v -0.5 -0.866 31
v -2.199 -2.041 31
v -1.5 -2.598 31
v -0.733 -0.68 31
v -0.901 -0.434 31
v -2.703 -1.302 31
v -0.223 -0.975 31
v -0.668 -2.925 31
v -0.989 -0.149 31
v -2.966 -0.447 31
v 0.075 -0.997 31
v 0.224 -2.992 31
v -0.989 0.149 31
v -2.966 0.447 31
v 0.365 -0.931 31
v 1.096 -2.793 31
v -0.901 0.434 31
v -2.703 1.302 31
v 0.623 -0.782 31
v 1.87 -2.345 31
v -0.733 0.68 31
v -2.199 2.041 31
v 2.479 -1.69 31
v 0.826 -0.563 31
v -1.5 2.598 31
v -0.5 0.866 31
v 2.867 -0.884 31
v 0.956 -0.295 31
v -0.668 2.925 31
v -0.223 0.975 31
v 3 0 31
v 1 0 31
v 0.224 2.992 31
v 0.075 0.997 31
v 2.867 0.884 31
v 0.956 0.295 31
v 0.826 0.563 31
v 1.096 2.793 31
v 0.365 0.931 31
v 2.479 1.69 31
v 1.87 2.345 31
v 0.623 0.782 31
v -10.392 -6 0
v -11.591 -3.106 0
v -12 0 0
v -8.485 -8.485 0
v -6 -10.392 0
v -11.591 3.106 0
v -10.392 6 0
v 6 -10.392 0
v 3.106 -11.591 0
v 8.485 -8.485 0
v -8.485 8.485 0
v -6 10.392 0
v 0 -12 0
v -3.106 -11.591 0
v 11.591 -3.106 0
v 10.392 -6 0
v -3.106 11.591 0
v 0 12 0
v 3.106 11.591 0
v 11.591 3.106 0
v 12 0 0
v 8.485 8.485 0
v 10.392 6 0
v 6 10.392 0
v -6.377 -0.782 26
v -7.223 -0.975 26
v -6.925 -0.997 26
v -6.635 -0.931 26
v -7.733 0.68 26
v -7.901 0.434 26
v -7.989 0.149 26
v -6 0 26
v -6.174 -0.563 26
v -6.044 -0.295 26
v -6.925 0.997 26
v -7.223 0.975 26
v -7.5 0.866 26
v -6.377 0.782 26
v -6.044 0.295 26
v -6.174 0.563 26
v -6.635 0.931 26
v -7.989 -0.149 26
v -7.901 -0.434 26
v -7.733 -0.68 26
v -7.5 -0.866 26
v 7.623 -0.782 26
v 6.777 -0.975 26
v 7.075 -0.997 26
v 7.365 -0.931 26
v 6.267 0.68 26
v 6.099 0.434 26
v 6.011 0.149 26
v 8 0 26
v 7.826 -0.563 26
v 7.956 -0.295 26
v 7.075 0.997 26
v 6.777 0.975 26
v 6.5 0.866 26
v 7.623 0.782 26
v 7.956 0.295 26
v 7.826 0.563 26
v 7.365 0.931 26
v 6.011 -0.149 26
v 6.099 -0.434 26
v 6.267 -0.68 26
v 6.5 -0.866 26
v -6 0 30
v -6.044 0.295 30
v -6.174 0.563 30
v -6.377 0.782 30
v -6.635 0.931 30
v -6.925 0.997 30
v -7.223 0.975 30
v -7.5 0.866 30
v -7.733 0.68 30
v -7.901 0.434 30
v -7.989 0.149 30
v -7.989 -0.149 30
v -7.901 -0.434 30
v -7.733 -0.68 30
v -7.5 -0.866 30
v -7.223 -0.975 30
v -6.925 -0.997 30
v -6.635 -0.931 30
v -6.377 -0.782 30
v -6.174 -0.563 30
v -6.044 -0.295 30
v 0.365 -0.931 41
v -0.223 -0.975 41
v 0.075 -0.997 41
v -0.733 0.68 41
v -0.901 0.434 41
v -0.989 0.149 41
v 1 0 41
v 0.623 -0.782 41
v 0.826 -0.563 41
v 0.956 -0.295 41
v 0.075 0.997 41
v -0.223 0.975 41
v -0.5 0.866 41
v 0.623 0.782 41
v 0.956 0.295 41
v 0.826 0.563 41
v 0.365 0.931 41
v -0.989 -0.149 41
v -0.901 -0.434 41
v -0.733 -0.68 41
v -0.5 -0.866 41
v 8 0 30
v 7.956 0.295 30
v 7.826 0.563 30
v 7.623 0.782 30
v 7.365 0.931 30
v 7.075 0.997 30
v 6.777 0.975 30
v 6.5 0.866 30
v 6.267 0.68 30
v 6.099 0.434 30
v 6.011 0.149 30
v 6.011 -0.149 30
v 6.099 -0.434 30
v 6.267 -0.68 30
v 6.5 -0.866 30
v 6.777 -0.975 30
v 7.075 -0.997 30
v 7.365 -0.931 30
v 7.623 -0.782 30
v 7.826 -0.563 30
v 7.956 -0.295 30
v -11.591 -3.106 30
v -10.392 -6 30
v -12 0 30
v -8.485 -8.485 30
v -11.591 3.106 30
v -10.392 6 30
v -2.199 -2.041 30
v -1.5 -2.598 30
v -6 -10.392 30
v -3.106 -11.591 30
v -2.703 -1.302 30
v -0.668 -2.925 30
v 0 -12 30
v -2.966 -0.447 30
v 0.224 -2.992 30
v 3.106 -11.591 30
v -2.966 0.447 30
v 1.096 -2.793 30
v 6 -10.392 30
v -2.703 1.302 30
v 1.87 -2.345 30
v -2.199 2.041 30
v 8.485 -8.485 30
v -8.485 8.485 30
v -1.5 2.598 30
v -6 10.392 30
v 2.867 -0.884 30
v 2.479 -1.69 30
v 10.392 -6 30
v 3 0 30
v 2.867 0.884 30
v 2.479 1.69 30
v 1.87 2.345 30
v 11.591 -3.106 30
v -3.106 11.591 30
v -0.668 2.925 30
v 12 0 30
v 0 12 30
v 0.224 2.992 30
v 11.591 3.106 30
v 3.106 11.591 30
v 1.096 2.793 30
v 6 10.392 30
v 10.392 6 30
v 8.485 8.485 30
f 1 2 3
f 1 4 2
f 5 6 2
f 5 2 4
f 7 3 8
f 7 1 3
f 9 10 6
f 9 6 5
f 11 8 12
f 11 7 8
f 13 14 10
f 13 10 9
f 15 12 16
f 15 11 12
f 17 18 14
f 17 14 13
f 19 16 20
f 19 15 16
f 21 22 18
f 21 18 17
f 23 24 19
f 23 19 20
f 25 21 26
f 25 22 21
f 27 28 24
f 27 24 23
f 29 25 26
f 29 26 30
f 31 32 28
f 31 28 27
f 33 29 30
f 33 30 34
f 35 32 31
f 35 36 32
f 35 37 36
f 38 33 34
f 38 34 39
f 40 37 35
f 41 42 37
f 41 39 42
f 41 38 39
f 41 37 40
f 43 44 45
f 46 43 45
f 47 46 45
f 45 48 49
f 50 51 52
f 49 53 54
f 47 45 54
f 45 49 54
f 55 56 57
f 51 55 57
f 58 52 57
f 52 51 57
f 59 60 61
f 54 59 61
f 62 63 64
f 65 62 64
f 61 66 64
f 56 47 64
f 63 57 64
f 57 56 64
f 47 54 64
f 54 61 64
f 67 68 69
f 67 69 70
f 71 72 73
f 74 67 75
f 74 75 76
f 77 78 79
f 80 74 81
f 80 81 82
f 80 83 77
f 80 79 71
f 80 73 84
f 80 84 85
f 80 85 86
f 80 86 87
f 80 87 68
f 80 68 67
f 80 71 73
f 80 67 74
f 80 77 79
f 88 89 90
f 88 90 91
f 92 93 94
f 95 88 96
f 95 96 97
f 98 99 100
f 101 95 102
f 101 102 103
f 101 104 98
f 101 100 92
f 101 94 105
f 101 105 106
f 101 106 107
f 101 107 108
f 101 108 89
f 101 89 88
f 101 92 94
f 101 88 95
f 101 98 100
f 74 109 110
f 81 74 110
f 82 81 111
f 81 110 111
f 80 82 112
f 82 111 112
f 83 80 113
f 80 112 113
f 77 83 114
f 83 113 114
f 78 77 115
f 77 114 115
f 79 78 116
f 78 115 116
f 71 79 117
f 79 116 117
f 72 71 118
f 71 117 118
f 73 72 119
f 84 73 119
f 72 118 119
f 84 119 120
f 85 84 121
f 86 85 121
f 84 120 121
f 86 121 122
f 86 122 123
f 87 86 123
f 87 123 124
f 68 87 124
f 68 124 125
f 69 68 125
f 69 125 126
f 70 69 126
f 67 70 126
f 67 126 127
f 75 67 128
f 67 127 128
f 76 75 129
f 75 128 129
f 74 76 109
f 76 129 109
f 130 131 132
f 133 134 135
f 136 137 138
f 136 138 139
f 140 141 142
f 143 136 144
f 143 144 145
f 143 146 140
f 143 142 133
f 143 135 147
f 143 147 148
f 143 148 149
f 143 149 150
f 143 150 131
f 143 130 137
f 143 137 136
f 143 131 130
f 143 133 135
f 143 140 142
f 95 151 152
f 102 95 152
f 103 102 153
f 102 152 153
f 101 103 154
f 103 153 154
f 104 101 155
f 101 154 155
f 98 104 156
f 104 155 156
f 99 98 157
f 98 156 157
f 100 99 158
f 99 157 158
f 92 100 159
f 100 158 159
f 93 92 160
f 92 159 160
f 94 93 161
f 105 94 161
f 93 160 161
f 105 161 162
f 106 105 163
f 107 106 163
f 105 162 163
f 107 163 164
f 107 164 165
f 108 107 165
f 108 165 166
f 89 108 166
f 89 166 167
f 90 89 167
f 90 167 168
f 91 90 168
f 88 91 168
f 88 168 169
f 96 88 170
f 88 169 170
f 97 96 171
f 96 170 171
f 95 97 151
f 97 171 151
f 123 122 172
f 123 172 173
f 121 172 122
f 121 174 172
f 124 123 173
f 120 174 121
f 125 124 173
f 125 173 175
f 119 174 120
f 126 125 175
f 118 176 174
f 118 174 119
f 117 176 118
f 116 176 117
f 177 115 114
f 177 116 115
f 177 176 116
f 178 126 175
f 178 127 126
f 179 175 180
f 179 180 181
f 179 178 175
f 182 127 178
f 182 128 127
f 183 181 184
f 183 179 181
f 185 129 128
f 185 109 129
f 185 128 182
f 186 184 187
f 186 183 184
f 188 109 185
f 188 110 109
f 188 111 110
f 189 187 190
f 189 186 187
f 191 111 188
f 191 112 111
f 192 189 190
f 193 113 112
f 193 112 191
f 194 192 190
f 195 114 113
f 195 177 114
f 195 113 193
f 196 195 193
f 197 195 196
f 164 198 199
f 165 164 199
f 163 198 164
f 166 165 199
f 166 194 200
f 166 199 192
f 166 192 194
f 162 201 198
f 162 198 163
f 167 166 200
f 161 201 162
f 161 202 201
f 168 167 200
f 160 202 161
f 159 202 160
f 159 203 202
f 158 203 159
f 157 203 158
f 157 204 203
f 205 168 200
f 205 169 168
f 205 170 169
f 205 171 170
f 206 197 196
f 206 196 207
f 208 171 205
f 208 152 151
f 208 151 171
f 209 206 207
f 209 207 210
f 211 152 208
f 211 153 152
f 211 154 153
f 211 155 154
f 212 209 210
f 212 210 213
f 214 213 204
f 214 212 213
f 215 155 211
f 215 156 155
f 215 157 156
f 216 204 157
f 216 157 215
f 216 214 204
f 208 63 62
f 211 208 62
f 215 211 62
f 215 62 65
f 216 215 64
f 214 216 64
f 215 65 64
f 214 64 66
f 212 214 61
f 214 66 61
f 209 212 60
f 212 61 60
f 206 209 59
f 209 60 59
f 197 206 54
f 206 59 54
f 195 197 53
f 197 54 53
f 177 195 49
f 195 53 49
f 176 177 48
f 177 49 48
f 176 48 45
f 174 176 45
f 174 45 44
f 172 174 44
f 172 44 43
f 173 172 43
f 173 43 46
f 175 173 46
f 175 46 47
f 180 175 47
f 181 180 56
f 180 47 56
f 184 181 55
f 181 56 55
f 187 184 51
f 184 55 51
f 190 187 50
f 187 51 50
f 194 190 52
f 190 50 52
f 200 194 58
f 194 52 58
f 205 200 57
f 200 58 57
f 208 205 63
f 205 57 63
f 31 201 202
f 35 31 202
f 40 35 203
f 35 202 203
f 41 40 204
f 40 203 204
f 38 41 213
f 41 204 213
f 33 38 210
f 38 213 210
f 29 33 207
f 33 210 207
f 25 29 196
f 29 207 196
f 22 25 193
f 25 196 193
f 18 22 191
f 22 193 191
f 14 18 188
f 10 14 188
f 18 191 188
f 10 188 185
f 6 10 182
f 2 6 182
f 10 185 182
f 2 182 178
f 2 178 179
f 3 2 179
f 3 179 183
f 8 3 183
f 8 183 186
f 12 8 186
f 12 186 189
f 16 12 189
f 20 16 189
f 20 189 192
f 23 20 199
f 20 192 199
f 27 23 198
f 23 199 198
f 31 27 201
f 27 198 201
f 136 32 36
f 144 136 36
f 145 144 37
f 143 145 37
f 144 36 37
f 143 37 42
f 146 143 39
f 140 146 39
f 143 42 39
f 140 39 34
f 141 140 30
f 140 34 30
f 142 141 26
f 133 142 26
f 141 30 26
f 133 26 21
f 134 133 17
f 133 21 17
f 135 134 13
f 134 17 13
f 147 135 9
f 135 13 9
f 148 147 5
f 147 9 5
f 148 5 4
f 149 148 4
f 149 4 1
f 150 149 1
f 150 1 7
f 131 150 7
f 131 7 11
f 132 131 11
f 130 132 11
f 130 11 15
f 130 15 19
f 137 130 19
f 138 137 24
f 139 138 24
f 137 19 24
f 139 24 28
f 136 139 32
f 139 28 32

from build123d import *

# Parameters (mm, degrees)
SKETCH_R     = 12
PAD_DEPTH    = 30
SKETCH001_R  = 3
PAD001_DEPTH = 1
SKETCH002_R  = 1
PAD002_DEPTH = 10
SKETCH003_R  = 1
POCKET_DEPTH = 4


with BuildPart() as part:
    # Sketch → Pad (new body)
    with BuildSketch(Plane.XY):
        Circle(SKETCH_R)
    extrude(amount=PAD_DEPTH)

    # Sketch001 (on Face3 of Pad) → Pad001 (join)
    with BuildSketch(Plane.XY.offset(30)):
        Circle(SKETCH001_R)
    extrude(amount=PAD001_DEPTH)

    # Sketch002 (on Face5 of Pad001) → Pad002 (join)
    with BuildSketch(Plane.XY.offset(31)):
        Circle(SKETCH002_R)
    extrude(amount=PAD002_DEPTH)

    # Sketch003 (on Face3 of Pad002) → Pocket (cut)
    with BuildSketch(Plane.XY.offset(30)):
        with Locations((-7, 0)):
            Circle(SKETCH003_R)
        with Locations((7, 0)):
            Circle(SKETCH003_R)
    extrude(amount=-POCKET_DEPTH, mode=Mode.SUBTRACT)


solid = part.part
